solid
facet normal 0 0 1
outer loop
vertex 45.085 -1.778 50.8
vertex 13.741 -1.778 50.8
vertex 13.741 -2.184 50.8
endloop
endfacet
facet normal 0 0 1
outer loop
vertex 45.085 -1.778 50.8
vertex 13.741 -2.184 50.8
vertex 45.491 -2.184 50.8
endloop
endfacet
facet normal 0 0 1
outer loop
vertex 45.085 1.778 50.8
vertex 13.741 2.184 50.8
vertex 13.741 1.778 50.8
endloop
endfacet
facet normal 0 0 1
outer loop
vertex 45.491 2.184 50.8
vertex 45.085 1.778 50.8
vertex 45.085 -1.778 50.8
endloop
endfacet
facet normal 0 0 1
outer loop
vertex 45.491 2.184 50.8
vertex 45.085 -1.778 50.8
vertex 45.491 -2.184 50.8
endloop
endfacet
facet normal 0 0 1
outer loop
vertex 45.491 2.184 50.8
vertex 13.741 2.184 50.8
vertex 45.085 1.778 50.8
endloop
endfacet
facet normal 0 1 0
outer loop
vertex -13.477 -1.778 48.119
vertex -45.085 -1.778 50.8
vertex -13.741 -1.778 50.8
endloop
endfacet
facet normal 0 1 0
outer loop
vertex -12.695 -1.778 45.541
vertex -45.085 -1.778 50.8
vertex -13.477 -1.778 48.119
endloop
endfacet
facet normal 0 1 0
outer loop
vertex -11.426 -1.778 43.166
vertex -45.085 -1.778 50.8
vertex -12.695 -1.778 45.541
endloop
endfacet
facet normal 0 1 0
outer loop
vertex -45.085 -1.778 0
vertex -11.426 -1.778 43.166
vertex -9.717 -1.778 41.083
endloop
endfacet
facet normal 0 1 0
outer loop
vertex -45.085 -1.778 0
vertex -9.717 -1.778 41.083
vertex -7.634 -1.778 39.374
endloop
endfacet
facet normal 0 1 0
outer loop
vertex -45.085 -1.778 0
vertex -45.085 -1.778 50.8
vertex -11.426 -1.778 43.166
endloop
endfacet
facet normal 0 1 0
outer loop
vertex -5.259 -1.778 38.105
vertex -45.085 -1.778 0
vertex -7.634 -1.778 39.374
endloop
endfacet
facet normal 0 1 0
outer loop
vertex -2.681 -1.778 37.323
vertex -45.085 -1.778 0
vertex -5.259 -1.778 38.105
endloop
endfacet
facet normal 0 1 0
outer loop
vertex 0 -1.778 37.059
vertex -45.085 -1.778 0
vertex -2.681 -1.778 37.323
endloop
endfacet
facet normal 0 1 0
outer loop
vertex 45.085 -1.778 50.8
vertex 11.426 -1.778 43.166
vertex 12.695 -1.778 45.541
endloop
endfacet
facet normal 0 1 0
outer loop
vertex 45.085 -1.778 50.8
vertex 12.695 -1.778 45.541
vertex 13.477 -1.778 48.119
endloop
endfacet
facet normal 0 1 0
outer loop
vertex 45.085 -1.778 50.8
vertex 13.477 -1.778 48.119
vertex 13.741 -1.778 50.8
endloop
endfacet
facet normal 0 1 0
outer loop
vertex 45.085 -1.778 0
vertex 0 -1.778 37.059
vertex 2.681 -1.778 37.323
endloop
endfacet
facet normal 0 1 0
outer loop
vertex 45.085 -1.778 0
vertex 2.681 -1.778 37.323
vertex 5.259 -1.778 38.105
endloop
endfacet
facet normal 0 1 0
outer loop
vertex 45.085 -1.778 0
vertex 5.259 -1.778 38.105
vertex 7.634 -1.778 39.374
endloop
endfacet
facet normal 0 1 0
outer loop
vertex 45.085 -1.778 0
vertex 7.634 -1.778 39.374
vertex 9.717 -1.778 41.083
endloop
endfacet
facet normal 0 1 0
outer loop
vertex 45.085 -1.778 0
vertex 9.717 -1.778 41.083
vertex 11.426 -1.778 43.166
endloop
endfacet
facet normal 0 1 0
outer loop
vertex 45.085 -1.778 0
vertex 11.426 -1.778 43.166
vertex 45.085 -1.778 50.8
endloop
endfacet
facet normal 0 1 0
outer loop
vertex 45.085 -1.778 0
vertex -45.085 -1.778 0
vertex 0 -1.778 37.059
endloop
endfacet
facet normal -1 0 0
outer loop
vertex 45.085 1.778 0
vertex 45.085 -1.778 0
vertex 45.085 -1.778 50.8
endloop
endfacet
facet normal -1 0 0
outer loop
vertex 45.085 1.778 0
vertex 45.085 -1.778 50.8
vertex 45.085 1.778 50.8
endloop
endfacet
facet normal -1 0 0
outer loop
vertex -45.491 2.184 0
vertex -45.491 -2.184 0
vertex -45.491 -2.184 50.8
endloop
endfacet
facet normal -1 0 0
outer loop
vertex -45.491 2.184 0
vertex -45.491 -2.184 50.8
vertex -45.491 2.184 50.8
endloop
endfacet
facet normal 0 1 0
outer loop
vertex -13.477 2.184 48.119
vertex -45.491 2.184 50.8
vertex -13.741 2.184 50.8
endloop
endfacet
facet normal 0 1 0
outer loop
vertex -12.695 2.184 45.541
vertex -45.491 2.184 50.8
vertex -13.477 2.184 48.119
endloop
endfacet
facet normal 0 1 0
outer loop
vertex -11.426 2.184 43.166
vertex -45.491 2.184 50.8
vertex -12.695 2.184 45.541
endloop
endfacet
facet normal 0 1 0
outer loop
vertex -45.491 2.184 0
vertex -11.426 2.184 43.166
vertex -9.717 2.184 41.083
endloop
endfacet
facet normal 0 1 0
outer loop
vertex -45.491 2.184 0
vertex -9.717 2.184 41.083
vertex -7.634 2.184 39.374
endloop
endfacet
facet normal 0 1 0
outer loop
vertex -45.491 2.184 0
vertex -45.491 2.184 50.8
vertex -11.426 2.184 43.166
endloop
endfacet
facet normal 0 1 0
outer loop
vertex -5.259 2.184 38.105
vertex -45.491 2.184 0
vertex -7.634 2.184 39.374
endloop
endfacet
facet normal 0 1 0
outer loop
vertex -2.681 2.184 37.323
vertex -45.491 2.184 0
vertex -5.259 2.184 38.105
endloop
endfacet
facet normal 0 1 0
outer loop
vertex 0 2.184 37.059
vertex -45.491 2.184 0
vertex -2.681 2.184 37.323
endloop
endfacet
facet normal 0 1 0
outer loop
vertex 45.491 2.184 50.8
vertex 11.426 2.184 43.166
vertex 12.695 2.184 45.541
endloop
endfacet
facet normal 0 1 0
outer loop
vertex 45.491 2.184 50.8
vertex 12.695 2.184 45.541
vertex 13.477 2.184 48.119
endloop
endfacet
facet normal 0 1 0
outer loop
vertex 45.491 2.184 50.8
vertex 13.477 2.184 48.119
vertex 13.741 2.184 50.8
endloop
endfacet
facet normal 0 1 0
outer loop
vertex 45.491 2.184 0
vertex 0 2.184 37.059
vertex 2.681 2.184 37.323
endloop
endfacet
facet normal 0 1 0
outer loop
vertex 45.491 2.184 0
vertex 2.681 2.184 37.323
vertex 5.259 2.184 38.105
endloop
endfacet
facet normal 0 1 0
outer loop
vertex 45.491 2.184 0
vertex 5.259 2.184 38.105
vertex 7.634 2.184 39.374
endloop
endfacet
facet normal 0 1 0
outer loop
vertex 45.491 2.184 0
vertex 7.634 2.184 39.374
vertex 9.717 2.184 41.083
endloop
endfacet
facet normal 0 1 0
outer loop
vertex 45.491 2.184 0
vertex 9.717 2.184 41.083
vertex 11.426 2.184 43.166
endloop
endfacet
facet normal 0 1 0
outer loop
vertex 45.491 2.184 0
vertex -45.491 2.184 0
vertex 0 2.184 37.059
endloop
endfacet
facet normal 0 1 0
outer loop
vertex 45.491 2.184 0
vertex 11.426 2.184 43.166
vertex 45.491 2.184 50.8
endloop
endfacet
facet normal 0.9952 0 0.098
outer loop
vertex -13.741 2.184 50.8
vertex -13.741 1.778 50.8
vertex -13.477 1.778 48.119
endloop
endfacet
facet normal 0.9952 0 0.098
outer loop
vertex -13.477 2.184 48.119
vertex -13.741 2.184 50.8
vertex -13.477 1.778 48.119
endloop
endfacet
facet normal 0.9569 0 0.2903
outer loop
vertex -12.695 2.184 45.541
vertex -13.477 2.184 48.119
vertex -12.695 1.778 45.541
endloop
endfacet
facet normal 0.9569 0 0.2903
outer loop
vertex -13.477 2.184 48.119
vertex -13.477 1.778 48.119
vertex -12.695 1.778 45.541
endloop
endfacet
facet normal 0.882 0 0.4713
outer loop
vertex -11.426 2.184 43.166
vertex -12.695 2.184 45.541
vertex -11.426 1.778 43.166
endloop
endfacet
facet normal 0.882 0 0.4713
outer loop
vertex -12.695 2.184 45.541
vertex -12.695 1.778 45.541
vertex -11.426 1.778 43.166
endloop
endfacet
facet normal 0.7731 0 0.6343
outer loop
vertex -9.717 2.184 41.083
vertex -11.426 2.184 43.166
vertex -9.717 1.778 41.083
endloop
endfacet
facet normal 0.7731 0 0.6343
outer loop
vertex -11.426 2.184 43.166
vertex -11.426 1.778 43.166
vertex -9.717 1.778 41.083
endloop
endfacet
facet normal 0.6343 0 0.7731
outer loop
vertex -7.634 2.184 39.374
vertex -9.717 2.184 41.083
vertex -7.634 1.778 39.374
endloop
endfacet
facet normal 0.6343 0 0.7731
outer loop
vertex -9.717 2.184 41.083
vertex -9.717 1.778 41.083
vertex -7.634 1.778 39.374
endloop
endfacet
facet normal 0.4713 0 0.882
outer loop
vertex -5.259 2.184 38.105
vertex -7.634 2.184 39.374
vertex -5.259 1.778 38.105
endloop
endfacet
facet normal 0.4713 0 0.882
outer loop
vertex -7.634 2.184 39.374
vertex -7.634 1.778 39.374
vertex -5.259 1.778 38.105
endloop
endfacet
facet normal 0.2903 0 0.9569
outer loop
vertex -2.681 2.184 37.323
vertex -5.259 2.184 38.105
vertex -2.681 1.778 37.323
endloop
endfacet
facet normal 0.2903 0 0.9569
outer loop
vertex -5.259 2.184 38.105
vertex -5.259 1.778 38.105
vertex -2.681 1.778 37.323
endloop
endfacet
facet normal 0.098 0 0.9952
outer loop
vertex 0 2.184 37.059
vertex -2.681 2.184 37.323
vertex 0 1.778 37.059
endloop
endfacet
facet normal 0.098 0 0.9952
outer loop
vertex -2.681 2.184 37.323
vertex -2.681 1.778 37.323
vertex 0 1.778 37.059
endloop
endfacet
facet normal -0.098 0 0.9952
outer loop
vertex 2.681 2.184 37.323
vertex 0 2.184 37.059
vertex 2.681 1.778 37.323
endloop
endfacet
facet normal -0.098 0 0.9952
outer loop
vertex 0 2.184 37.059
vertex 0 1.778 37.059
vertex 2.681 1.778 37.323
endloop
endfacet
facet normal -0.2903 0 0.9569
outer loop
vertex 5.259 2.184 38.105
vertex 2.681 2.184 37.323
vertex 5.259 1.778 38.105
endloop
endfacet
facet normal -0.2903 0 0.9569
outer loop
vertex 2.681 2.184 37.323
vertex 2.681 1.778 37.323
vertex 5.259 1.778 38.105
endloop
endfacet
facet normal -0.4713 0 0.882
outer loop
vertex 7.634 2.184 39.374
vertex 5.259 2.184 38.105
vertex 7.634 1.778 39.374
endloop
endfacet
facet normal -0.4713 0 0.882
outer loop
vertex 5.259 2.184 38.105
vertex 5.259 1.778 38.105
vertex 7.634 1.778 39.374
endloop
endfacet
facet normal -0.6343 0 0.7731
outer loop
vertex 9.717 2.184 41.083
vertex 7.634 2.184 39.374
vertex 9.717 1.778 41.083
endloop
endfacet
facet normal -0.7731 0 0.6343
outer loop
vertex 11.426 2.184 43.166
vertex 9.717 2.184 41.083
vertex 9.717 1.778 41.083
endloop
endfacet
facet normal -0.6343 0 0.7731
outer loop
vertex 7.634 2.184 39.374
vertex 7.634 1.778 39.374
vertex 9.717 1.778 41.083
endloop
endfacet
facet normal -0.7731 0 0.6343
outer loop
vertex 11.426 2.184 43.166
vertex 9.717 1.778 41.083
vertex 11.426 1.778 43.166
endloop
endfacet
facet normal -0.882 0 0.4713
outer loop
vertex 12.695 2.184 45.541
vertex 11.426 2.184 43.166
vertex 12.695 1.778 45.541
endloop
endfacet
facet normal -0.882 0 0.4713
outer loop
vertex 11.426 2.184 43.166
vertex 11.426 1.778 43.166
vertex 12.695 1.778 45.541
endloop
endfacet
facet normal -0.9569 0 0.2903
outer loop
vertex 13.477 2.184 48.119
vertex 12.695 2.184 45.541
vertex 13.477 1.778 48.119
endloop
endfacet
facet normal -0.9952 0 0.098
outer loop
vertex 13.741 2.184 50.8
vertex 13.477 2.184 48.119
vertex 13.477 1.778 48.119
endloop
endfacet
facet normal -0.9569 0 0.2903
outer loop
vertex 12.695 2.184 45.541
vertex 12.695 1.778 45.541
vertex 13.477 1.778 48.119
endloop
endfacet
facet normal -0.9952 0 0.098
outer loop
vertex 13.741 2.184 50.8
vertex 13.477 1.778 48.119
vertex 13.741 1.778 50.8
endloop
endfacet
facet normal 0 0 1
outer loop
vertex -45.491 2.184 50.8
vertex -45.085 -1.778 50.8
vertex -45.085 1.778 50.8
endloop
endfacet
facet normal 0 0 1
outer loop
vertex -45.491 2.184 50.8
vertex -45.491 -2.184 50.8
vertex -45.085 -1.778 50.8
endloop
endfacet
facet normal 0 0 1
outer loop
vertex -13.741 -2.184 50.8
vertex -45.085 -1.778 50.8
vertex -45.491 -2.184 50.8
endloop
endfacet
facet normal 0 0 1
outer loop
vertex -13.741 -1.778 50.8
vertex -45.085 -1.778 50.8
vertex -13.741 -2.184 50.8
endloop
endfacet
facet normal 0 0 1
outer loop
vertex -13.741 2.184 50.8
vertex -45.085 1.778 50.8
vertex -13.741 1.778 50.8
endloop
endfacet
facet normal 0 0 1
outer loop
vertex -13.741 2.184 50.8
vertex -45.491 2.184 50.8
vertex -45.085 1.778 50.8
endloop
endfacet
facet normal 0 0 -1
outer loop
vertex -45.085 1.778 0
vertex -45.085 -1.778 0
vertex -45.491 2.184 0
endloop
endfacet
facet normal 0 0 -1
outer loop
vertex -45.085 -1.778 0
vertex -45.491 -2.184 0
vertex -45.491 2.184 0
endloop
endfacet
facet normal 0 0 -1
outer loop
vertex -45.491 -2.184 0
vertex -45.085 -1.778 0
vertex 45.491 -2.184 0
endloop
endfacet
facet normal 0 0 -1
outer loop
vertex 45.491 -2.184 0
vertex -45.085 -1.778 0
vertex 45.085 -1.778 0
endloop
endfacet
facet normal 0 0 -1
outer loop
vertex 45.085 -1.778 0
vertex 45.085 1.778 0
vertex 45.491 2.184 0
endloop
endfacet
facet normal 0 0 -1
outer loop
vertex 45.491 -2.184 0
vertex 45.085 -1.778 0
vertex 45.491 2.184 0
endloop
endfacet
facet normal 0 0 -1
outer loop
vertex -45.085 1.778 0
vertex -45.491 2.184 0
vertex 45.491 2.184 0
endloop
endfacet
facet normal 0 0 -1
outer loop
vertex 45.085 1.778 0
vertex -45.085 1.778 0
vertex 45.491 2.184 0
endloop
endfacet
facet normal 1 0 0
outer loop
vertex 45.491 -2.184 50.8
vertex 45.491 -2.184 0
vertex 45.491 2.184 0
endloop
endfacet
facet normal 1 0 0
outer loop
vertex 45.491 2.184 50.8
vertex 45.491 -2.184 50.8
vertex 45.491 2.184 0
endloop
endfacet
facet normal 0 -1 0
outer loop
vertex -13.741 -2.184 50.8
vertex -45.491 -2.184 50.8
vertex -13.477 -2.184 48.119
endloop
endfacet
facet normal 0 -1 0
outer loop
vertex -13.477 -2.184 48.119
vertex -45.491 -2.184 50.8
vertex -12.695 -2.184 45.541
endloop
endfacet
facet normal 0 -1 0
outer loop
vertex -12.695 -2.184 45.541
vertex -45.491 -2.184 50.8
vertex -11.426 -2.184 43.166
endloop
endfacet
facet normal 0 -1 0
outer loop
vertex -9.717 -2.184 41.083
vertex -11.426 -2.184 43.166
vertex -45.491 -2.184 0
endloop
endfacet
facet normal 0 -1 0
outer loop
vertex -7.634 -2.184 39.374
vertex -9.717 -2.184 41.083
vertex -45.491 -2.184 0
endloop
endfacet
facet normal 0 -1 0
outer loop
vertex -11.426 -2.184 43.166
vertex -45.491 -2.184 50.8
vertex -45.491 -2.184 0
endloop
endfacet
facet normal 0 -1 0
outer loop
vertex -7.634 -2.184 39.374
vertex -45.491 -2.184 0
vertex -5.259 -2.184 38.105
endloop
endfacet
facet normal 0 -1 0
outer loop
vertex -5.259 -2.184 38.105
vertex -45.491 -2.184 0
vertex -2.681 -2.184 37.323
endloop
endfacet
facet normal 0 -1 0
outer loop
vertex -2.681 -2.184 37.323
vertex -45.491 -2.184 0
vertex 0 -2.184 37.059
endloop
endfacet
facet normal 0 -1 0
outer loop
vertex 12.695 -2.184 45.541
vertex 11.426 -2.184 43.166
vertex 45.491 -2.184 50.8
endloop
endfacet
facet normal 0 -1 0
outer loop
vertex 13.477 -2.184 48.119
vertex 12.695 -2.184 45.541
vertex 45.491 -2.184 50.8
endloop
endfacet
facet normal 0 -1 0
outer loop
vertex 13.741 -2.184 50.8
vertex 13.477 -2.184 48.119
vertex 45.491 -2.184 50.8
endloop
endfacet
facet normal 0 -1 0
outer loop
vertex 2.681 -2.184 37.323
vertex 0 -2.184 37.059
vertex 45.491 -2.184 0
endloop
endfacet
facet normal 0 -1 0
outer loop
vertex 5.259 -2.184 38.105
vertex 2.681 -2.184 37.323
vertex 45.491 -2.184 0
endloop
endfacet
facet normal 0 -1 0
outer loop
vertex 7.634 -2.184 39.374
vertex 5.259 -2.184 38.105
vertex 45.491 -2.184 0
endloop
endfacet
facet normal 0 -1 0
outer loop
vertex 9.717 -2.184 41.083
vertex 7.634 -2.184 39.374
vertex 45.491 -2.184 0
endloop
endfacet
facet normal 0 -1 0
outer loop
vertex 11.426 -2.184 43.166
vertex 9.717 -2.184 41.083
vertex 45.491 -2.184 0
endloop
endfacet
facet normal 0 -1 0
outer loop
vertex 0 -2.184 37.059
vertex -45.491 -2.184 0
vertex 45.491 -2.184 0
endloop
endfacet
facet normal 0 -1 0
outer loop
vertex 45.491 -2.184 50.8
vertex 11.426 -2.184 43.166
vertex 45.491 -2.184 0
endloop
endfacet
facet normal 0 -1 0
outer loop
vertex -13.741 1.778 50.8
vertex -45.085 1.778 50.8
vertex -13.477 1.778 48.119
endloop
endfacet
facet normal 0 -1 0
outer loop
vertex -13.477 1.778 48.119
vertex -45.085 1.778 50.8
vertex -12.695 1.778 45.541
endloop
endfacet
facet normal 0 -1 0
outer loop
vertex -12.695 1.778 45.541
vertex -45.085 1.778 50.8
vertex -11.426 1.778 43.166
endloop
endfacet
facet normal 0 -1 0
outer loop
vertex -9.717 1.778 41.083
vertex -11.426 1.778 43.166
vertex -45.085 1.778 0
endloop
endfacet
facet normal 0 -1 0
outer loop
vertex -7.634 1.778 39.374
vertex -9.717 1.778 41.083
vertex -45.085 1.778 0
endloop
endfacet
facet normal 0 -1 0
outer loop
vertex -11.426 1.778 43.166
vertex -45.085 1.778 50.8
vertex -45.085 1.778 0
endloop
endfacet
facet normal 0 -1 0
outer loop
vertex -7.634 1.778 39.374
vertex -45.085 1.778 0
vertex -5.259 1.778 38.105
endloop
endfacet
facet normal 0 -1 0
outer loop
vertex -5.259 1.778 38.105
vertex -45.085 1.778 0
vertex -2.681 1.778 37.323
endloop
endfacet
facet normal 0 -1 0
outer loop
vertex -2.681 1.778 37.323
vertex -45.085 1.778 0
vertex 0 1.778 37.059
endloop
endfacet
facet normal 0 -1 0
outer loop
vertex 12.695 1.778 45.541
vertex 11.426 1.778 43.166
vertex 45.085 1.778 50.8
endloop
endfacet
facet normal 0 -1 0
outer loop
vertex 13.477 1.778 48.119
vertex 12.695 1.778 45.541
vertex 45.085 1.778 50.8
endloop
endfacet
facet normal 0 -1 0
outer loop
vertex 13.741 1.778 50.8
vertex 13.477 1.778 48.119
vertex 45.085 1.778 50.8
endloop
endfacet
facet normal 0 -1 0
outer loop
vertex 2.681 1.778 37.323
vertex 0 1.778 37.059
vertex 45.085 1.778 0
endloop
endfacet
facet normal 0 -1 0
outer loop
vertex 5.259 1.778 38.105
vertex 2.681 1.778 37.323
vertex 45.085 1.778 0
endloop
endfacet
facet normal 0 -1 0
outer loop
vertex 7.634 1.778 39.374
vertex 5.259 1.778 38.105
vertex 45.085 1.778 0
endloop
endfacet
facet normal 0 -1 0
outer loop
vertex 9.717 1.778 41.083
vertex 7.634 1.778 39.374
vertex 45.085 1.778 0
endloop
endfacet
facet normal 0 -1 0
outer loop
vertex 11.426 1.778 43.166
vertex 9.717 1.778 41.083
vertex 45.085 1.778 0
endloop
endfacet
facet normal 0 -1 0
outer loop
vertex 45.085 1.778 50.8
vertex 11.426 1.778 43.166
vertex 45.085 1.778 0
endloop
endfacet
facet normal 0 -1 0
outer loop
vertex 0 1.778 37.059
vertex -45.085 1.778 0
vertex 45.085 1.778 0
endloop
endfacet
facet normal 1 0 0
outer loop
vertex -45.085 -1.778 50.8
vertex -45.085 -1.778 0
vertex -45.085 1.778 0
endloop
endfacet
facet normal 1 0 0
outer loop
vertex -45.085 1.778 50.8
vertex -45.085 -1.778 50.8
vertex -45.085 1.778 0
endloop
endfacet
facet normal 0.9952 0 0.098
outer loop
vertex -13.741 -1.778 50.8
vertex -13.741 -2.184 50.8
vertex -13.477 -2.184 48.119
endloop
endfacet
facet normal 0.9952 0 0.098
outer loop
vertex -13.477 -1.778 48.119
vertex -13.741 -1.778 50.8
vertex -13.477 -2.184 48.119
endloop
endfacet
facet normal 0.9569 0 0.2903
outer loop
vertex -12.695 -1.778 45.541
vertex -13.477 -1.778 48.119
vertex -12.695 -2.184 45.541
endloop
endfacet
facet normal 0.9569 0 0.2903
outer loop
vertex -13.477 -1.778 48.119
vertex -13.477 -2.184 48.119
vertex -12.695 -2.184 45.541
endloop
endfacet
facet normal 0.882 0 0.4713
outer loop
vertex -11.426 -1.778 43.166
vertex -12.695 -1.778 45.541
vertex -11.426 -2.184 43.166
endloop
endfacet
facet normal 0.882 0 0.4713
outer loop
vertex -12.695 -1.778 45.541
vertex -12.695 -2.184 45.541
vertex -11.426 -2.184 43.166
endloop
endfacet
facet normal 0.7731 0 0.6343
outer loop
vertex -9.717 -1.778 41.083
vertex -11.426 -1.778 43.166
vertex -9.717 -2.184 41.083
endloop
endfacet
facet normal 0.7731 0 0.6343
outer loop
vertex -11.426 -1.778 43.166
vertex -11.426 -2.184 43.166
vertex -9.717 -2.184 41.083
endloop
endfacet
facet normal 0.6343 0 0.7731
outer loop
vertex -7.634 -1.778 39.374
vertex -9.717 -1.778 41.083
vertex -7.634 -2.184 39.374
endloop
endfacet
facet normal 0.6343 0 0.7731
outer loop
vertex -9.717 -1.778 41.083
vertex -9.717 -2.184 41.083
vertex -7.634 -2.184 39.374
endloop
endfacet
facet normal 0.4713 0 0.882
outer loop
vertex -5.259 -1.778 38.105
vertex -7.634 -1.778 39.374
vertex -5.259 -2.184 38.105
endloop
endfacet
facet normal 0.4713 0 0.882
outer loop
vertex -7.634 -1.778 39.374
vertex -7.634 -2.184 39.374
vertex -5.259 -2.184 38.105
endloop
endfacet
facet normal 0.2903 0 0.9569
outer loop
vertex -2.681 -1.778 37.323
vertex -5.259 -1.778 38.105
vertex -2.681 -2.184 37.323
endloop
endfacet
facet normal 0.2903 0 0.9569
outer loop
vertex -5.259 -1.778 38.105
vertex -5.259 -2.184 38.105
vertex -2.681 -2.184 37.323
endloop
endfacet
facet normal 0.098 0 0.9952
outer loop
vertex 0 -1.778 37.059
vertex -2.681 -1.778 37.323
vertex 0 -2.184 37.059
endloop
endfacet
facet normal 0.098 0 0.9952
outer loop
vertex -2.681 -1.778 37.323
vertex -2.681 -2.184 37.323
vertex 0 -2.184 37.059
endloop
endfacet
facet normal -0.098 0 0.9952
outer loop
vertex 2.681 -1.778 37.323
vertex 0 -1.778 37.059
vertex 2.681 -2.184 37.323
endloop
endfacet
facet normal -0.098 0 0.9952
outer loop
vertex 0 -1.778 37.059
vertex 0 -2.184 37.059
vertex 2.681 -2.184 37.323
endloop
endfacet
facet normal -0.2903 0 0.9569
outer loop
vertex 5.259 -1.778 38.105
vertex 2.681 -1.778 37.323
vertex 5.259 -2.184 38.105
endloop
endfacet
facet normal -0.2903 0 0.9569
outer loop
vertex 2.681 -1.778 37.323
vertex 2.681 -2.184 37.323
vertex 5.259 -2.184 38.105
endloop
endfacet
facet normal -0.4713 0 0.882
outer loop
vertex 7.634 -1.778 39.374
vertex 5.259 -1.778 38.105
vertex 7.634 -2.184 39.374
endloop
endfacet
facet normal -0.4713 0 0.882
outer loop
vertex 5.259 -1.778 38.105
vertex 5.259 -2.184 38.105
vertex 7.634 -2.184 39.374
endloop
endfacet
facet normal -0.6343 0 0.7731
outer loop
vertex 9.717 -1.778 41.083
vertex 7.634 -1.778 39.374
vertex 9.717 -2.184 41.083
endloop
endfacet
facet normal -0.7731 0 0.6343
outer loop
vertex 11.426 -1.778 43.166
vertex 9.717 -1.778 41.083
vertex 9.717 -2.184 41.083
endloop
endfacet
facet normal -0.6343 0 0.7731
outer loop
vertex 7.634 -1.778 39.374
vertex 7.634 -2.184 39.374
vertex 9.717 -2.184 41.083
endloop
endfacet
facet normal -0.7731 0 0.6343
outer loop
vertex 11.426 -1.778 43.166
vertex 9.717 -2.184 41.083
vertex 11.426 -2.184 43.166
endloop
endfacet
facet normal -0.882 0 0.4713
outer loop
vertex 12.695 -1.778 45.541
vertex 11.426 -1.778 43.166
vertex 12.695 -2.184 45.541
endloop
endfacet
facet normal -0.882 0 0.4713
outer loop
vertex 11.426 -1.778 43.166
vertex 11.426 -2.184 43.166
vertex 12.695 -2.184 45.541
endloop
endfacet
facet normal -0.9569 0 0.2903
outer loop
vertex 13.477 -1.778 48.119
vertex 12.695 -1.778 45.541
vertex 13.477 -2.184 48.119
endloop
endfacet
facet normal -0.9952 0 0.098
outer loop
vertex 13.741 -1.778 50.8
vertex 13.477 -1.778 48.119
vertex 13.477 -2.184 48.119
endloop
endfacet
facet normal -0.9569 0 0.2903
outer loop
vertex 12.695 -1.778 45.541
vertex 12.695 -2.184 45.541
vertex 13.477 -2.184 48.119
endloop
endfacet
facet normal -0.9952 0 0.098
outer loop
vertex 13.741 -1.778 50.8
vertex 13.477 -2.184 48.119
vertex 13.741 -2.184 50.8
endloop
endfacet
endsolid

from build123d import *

# Parameters (mm, degrees)
F0_W     = 90.9828
F0_H     = 4.3688
F0_W_2   = 90.17
F0_H_2   = 3.556
F1_DEPTH = 50.8
F3_DEPTH = 4.3698


with BuildPart() as f1:
    # F0 (on Top) → F1 (new body)
    with BuildSketch(Plane.XY):
        Rectangle(F0_W, F0_H)
        Rectangle(F0_W_2, F0_H_2, mode=Mode.SUBTRACT)
    extrude(amount=F1_DEPTH)

    # F2 (on face) → F3 (cut, through all)
    with BuildSketch(Plane.XZ.offset(2.1844)):
        with BuildLine():
            Line((13.7414, 50.8), (-13.7414, 50.8))
            ThreePointArc((-13.7414, 50.8), (0, 37.0586), (13.7414, 50.8))
        make_face()
    extrude(amount=-F3_DEPTH, mode=Mode.SUBTRACT)


solid = f1.part
